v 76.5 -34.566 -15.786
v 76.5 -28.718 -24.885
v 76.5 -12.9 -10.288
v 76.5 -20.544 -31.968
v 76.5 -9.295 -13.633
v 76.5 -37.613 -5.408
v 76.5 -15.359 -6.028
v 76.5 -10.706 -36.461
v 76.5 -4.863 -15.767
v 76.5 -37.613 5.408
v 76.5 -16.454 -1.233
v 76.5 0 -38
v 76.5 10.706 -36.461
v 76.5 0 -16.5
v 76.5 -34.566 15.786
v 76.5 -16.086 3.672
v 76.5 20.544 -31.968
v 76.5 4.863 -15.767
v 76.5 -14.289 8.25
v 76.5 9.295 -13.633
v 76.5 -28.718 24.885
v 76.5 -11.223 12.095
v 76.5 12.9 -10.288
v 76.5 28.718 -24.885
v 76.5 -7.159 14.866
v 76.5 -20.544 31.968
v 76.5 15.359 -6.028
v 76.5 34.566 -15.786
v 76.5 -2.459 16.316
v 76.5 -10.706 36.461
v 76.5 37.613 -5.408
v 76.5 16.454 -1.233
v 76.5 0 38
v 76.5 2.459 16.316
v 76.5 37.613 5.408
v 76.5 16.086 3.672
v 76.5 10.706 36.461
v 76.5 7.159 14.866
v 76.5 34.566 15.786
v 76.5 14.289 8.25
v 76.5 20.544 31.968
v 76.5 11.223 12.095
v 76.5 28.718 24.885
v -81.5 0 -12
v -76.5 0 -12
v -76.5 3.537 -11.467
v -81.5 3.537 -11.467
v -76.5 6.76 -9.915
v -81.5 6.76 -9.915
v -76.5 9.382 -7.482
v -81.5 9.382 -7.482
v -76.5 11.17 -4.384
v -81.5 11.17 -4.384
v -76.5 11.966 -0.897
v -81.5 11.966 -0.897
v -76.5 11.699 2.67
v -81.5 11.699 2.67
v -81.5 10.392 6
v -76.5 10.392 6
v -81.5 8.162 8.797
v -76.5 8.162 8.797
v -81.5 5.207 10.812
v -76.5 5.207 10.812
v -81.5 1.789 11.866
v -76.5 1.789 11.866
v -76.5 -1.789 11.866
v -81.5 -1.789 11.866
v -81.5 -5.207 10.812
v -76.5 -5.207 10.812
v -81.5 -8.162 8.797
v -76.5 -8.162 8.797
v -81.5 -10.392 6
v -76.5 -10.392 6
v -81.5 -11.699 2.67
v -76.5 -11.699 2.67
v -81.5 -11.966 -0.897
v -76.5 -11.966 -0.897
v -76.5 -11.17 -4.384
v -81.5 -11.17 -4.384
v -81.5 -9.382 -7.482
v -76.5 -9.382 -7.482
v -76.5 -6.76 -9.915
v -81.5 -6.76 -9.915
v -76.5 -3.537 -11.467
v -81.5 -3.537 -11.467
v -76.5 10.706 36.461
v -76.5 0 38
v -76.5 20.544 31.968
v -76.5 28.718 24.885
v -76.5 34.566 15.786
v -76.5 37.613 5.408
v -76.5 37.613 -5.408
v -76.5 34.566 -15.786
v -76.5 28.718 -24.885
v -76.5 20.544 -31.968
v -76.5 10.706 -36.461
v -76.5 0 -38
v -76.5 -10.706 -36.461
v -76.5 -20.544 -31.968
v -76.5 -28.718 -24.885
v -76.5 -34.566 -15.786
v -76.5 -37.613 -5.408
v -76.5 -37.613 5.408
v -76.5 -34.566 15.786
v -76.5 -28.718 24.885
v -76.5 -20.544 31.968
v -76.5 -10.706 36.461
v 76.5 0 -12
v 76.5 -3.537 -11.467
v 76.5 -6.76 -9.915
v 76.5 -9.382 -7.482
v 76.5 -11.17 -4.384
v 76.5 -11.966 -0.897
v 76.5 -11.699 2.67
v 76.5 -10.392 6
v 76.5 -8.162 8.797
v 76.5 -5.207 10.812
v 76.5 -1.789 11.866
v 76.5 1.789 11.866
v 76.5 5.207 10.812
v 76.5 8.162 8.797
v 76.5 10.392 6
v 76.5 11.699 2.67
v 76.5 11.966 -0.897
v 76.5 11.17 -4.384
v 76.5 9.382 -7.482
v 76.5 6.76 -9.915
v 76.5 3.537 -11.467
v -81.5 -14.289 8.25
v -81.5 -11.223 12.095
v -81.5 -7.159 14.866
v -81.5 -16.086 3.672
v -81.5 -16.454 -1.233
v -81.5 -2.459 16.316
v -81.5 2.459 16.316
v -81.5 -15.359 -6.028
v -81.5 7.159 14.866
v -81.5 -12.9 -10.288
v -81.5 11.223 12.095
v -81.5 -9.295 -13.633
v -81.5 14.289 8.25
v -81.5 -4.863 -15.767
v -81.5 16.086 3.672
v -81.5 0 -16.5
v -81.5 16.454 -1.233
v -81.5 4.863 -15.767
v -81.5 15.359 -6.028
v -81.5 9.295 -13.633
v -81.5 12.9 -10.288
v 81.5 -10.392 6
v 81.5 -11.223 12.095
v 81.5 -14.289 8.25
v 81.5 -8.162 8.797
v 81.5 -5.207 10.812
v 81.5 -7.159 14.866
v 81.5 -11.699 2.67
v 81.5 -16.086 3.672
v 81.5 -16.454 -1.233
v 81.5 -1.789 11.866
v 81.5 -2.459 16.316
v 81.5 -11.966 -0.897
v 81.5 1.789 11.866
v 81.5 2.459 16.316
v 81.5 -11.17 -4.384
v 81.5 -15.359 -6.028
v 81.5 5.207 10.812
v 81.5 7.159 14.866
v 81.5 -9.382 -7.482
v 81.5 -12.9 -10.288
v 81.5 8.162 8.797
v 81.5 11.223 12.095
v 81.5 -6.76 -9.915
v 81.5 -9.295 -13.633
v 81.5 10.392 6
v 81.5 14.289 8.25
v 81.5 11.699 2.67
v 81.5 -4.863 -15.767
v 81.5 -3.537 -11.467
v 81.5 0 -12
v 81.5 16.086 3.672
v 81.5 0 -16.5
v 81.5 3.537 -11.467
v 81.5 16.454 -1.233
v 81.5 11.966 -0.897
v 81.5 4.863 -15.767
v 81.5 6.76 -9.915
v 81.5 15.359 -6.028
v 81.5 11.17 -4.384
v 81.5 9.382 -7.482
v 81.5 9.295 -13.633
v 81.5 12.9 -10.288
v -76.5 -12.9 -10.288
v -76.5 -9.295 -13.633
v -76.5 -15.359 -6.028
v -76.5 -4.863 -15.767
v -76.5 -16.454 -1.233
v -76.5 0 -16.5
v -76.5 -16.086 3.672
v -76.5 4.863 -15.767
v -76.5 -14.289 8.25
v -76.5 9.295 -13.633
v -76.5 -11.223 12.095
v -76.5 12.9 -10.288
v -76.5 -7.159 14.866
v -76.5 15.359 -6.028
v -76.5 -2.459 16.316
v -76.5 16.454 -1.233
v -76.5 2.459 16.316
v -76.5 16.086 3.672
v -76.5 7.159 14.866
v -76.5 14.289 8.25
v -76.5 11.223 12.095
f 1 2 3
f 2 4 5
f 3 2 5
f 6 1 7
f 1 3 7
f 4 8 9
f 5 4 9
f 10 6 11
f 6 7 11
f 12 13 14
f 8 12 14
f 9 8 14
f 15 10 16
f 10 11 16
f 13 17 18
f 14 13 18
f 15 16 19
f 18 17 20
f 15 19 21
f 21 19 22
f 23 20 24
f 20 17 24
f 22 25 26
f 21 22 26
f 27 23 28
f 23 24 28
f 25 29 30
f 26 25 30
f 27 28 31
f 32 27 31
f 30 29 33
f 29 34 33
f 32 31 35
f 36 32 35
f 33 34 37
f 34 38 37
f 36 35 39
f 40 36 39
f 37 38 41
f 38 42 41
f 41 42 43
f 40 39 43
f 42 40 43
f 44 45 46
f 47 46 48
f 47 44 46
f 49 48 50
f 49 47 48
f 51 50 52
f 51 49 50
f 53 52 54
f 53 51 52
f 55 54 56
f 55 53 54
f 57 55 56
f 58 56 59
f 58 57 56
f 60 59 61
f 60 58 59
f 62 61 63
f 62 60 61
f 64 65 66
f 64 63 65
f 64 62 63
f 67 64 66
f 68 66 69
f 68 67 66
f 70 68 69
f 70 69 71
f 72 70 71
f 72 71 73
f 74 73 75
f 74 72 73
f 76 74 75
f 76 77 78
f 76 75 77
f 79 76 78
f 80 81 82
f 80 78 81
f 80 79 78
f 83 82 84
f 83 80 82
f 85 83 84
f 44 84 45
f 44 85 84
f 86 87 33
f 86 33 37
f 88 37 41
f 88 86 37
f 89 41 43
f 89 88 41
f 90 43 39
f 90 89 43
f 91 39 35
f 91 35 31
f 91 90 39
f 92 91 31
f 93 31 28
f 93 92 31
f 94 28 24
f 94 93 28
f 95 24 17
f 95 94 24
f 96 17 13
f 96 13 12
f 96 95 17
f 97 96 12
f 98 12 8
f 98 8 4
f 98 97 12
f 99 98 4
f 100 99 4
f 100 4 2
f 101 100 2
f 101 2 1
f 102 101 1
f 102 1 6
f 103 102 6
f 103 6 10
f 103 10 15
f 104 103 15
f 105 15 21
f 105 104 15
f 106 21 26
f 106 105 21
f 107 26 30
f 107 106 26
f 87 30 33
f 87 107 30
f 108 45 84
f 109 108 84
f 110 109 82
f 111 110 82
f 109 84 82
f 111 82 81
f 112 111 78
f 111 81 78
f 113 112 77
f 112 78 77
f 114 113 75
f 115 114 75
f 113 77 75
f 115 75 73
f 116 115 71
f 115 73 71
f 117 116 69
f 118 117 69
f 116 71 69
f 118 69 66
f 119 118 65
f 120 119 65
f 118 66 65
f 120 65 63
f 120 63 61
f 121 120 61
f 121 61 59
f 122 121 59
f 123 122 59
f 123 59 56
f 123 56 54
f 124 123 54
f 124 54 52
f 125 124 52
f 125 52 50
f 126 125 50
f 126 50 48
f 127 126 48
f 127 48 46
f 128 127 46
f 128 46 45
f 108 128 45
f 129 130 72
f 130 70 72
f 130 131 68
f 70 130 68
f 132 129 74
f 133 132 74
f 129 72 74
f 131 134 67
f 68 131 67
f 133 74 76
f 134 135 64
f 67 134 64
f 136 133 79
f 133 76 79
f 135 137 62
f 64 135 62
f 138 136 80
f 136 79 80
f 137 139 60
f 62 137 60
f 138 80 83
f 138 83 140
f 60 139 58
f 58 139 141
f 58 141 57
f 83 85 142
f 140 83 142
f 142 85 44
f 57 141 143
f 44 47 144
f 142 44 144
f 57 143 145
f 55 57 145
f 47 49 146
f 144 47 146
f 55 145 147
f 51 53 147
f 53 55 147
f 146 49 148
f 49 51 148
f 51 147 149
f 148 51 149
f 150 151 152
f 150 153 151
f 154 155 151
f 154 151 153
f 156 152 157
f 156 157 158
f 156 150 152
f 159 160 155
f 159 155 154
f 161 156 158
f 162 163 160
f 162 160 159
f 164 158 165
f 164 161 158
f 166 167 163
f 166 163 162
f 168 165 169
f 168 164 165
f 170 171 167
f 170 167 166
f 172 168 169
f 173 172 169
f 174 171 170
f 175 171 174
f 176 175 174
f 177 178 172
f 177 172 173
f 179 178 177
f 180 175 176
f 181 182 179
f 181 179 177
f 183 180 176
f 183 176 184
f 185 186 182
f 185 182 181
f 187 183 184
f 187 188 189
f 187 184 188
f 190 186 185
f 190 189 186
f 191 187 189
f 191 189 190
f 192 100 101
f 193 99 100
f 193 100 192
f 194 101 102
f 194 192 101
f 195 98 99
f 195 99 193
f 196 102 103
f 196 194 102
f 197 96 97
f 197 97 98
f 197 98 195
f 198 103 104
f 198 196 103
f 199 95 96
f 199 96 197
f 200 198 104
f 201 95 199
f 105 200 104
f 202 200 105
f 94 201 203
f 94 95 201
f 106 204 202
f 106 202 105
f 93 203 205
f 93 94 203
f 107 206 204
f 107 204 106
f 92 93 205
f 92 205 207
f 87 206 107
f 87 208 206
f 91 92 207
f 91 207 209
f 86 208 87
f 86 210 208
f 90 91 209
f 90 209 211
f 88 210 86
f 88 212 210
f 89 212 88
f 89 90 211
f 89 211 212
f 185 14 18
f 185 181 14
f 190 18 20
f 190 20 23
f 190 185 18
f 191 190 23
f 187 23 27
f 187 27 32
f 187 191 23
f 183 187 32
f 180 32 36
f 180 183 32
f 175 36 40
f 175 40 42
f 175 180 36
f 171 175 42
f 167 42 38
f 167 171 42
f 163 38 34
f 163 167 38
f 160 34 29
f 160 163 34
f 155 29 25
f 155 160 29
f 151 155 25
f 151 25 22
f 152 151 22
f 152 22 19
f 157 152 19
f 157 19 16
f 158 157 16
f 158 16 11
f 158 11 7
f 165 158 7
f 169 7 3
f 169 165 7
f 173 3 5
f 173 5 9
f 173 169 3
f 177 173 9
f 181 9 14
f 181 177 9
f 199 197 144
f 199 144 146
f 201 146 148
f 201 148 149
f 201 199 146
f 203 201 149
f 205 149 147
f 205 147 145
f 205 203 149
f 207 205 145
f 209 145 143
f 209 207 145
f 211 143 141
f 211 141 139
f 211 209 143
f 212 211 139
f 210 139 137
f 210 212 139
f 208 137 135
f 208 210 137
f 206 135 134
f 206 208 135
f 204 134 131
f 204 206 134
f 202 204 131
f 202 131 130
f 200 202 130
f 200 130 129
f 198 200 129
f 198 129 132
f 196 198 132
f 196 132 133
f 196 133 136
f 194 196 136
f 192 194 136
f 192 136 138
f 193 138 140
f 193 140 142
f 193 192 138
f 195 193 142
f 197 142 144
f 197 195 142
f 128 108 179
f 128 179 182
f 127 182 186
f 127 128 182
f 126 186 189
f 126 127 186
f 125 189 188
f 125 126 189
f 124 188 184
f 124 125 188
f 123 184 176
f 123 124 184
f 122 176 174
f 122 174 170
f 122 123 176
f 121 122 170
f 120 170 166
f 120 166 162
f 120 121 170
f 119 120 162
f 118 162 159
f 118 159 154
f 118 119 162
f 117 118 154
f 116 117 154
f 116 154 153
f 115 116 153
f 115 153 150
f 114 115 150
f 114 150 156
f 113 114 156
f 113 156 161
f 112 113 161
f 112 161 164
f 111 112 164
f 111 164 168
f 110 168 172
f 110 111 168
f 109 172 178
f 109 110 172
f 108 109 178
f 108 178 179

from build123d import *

# Parameters (mm, degrees)
SKETCH1_R               = 16.5
SKETCH1_R_2             = 12
BOSS_EXTRUDE1_DEPTH     = 81.5
BOSS_EXTRUDE2_START     = -5
SKETCH2_R               = 38
BOSS_EXTRUDE2_DEPTH     = 153
SKETCH3_R               = 12
CUT_EXTRUDE1_DEPTH      = 167.88918479
CUT_EXTRUDE1_DEPTH_BACK = 167.88918479


with BuildPart() as part:
    # Sketch1 → Boss-Extrude1 (new, symmetric)
    with BuildSketch(Plane(origin=(0, 0, 0), x_dir=(0, 0, -1), z_dir=(1, 0, 0))):
        Circle(SKETCH1_R)
        Circle(SKETCH1_R_2, mode=Mode.SUBTRACT)
    extrude(amount=BOSS_EXTRUDE1_DEPTH, both=True)

    # Sketch2 → Boss-Extrude2 (add)
    with BuildSketch(Plane.ZY.offset(81.5).offset(BOSS_EXTRUDE2_START)):
        Circle(SKETCH2_R)
    extrude(amount=-BOSS_EXTRUDE2_DEPTH)

    # Sketch3 → Cut-Extrude1 (cut, two sides)
    with BuildSketch(Plane.ZY.offset(76.5)) as cut_extrude1_sk:
        with Locations(Location((0, 0, 0), (0, 0, 180))):
            Circle(SKETCH3_R)
    extrude(amount=CUT_EXTRUDE1_DEPTH, mode=Mode.SUBTRACT)
    extrude(cut_extrude1_sk.sketch, amount=-CUT_EXTRUDE1_DEPTH_BACK, mode=Mode.SUBTRACT)


solid = part.part
